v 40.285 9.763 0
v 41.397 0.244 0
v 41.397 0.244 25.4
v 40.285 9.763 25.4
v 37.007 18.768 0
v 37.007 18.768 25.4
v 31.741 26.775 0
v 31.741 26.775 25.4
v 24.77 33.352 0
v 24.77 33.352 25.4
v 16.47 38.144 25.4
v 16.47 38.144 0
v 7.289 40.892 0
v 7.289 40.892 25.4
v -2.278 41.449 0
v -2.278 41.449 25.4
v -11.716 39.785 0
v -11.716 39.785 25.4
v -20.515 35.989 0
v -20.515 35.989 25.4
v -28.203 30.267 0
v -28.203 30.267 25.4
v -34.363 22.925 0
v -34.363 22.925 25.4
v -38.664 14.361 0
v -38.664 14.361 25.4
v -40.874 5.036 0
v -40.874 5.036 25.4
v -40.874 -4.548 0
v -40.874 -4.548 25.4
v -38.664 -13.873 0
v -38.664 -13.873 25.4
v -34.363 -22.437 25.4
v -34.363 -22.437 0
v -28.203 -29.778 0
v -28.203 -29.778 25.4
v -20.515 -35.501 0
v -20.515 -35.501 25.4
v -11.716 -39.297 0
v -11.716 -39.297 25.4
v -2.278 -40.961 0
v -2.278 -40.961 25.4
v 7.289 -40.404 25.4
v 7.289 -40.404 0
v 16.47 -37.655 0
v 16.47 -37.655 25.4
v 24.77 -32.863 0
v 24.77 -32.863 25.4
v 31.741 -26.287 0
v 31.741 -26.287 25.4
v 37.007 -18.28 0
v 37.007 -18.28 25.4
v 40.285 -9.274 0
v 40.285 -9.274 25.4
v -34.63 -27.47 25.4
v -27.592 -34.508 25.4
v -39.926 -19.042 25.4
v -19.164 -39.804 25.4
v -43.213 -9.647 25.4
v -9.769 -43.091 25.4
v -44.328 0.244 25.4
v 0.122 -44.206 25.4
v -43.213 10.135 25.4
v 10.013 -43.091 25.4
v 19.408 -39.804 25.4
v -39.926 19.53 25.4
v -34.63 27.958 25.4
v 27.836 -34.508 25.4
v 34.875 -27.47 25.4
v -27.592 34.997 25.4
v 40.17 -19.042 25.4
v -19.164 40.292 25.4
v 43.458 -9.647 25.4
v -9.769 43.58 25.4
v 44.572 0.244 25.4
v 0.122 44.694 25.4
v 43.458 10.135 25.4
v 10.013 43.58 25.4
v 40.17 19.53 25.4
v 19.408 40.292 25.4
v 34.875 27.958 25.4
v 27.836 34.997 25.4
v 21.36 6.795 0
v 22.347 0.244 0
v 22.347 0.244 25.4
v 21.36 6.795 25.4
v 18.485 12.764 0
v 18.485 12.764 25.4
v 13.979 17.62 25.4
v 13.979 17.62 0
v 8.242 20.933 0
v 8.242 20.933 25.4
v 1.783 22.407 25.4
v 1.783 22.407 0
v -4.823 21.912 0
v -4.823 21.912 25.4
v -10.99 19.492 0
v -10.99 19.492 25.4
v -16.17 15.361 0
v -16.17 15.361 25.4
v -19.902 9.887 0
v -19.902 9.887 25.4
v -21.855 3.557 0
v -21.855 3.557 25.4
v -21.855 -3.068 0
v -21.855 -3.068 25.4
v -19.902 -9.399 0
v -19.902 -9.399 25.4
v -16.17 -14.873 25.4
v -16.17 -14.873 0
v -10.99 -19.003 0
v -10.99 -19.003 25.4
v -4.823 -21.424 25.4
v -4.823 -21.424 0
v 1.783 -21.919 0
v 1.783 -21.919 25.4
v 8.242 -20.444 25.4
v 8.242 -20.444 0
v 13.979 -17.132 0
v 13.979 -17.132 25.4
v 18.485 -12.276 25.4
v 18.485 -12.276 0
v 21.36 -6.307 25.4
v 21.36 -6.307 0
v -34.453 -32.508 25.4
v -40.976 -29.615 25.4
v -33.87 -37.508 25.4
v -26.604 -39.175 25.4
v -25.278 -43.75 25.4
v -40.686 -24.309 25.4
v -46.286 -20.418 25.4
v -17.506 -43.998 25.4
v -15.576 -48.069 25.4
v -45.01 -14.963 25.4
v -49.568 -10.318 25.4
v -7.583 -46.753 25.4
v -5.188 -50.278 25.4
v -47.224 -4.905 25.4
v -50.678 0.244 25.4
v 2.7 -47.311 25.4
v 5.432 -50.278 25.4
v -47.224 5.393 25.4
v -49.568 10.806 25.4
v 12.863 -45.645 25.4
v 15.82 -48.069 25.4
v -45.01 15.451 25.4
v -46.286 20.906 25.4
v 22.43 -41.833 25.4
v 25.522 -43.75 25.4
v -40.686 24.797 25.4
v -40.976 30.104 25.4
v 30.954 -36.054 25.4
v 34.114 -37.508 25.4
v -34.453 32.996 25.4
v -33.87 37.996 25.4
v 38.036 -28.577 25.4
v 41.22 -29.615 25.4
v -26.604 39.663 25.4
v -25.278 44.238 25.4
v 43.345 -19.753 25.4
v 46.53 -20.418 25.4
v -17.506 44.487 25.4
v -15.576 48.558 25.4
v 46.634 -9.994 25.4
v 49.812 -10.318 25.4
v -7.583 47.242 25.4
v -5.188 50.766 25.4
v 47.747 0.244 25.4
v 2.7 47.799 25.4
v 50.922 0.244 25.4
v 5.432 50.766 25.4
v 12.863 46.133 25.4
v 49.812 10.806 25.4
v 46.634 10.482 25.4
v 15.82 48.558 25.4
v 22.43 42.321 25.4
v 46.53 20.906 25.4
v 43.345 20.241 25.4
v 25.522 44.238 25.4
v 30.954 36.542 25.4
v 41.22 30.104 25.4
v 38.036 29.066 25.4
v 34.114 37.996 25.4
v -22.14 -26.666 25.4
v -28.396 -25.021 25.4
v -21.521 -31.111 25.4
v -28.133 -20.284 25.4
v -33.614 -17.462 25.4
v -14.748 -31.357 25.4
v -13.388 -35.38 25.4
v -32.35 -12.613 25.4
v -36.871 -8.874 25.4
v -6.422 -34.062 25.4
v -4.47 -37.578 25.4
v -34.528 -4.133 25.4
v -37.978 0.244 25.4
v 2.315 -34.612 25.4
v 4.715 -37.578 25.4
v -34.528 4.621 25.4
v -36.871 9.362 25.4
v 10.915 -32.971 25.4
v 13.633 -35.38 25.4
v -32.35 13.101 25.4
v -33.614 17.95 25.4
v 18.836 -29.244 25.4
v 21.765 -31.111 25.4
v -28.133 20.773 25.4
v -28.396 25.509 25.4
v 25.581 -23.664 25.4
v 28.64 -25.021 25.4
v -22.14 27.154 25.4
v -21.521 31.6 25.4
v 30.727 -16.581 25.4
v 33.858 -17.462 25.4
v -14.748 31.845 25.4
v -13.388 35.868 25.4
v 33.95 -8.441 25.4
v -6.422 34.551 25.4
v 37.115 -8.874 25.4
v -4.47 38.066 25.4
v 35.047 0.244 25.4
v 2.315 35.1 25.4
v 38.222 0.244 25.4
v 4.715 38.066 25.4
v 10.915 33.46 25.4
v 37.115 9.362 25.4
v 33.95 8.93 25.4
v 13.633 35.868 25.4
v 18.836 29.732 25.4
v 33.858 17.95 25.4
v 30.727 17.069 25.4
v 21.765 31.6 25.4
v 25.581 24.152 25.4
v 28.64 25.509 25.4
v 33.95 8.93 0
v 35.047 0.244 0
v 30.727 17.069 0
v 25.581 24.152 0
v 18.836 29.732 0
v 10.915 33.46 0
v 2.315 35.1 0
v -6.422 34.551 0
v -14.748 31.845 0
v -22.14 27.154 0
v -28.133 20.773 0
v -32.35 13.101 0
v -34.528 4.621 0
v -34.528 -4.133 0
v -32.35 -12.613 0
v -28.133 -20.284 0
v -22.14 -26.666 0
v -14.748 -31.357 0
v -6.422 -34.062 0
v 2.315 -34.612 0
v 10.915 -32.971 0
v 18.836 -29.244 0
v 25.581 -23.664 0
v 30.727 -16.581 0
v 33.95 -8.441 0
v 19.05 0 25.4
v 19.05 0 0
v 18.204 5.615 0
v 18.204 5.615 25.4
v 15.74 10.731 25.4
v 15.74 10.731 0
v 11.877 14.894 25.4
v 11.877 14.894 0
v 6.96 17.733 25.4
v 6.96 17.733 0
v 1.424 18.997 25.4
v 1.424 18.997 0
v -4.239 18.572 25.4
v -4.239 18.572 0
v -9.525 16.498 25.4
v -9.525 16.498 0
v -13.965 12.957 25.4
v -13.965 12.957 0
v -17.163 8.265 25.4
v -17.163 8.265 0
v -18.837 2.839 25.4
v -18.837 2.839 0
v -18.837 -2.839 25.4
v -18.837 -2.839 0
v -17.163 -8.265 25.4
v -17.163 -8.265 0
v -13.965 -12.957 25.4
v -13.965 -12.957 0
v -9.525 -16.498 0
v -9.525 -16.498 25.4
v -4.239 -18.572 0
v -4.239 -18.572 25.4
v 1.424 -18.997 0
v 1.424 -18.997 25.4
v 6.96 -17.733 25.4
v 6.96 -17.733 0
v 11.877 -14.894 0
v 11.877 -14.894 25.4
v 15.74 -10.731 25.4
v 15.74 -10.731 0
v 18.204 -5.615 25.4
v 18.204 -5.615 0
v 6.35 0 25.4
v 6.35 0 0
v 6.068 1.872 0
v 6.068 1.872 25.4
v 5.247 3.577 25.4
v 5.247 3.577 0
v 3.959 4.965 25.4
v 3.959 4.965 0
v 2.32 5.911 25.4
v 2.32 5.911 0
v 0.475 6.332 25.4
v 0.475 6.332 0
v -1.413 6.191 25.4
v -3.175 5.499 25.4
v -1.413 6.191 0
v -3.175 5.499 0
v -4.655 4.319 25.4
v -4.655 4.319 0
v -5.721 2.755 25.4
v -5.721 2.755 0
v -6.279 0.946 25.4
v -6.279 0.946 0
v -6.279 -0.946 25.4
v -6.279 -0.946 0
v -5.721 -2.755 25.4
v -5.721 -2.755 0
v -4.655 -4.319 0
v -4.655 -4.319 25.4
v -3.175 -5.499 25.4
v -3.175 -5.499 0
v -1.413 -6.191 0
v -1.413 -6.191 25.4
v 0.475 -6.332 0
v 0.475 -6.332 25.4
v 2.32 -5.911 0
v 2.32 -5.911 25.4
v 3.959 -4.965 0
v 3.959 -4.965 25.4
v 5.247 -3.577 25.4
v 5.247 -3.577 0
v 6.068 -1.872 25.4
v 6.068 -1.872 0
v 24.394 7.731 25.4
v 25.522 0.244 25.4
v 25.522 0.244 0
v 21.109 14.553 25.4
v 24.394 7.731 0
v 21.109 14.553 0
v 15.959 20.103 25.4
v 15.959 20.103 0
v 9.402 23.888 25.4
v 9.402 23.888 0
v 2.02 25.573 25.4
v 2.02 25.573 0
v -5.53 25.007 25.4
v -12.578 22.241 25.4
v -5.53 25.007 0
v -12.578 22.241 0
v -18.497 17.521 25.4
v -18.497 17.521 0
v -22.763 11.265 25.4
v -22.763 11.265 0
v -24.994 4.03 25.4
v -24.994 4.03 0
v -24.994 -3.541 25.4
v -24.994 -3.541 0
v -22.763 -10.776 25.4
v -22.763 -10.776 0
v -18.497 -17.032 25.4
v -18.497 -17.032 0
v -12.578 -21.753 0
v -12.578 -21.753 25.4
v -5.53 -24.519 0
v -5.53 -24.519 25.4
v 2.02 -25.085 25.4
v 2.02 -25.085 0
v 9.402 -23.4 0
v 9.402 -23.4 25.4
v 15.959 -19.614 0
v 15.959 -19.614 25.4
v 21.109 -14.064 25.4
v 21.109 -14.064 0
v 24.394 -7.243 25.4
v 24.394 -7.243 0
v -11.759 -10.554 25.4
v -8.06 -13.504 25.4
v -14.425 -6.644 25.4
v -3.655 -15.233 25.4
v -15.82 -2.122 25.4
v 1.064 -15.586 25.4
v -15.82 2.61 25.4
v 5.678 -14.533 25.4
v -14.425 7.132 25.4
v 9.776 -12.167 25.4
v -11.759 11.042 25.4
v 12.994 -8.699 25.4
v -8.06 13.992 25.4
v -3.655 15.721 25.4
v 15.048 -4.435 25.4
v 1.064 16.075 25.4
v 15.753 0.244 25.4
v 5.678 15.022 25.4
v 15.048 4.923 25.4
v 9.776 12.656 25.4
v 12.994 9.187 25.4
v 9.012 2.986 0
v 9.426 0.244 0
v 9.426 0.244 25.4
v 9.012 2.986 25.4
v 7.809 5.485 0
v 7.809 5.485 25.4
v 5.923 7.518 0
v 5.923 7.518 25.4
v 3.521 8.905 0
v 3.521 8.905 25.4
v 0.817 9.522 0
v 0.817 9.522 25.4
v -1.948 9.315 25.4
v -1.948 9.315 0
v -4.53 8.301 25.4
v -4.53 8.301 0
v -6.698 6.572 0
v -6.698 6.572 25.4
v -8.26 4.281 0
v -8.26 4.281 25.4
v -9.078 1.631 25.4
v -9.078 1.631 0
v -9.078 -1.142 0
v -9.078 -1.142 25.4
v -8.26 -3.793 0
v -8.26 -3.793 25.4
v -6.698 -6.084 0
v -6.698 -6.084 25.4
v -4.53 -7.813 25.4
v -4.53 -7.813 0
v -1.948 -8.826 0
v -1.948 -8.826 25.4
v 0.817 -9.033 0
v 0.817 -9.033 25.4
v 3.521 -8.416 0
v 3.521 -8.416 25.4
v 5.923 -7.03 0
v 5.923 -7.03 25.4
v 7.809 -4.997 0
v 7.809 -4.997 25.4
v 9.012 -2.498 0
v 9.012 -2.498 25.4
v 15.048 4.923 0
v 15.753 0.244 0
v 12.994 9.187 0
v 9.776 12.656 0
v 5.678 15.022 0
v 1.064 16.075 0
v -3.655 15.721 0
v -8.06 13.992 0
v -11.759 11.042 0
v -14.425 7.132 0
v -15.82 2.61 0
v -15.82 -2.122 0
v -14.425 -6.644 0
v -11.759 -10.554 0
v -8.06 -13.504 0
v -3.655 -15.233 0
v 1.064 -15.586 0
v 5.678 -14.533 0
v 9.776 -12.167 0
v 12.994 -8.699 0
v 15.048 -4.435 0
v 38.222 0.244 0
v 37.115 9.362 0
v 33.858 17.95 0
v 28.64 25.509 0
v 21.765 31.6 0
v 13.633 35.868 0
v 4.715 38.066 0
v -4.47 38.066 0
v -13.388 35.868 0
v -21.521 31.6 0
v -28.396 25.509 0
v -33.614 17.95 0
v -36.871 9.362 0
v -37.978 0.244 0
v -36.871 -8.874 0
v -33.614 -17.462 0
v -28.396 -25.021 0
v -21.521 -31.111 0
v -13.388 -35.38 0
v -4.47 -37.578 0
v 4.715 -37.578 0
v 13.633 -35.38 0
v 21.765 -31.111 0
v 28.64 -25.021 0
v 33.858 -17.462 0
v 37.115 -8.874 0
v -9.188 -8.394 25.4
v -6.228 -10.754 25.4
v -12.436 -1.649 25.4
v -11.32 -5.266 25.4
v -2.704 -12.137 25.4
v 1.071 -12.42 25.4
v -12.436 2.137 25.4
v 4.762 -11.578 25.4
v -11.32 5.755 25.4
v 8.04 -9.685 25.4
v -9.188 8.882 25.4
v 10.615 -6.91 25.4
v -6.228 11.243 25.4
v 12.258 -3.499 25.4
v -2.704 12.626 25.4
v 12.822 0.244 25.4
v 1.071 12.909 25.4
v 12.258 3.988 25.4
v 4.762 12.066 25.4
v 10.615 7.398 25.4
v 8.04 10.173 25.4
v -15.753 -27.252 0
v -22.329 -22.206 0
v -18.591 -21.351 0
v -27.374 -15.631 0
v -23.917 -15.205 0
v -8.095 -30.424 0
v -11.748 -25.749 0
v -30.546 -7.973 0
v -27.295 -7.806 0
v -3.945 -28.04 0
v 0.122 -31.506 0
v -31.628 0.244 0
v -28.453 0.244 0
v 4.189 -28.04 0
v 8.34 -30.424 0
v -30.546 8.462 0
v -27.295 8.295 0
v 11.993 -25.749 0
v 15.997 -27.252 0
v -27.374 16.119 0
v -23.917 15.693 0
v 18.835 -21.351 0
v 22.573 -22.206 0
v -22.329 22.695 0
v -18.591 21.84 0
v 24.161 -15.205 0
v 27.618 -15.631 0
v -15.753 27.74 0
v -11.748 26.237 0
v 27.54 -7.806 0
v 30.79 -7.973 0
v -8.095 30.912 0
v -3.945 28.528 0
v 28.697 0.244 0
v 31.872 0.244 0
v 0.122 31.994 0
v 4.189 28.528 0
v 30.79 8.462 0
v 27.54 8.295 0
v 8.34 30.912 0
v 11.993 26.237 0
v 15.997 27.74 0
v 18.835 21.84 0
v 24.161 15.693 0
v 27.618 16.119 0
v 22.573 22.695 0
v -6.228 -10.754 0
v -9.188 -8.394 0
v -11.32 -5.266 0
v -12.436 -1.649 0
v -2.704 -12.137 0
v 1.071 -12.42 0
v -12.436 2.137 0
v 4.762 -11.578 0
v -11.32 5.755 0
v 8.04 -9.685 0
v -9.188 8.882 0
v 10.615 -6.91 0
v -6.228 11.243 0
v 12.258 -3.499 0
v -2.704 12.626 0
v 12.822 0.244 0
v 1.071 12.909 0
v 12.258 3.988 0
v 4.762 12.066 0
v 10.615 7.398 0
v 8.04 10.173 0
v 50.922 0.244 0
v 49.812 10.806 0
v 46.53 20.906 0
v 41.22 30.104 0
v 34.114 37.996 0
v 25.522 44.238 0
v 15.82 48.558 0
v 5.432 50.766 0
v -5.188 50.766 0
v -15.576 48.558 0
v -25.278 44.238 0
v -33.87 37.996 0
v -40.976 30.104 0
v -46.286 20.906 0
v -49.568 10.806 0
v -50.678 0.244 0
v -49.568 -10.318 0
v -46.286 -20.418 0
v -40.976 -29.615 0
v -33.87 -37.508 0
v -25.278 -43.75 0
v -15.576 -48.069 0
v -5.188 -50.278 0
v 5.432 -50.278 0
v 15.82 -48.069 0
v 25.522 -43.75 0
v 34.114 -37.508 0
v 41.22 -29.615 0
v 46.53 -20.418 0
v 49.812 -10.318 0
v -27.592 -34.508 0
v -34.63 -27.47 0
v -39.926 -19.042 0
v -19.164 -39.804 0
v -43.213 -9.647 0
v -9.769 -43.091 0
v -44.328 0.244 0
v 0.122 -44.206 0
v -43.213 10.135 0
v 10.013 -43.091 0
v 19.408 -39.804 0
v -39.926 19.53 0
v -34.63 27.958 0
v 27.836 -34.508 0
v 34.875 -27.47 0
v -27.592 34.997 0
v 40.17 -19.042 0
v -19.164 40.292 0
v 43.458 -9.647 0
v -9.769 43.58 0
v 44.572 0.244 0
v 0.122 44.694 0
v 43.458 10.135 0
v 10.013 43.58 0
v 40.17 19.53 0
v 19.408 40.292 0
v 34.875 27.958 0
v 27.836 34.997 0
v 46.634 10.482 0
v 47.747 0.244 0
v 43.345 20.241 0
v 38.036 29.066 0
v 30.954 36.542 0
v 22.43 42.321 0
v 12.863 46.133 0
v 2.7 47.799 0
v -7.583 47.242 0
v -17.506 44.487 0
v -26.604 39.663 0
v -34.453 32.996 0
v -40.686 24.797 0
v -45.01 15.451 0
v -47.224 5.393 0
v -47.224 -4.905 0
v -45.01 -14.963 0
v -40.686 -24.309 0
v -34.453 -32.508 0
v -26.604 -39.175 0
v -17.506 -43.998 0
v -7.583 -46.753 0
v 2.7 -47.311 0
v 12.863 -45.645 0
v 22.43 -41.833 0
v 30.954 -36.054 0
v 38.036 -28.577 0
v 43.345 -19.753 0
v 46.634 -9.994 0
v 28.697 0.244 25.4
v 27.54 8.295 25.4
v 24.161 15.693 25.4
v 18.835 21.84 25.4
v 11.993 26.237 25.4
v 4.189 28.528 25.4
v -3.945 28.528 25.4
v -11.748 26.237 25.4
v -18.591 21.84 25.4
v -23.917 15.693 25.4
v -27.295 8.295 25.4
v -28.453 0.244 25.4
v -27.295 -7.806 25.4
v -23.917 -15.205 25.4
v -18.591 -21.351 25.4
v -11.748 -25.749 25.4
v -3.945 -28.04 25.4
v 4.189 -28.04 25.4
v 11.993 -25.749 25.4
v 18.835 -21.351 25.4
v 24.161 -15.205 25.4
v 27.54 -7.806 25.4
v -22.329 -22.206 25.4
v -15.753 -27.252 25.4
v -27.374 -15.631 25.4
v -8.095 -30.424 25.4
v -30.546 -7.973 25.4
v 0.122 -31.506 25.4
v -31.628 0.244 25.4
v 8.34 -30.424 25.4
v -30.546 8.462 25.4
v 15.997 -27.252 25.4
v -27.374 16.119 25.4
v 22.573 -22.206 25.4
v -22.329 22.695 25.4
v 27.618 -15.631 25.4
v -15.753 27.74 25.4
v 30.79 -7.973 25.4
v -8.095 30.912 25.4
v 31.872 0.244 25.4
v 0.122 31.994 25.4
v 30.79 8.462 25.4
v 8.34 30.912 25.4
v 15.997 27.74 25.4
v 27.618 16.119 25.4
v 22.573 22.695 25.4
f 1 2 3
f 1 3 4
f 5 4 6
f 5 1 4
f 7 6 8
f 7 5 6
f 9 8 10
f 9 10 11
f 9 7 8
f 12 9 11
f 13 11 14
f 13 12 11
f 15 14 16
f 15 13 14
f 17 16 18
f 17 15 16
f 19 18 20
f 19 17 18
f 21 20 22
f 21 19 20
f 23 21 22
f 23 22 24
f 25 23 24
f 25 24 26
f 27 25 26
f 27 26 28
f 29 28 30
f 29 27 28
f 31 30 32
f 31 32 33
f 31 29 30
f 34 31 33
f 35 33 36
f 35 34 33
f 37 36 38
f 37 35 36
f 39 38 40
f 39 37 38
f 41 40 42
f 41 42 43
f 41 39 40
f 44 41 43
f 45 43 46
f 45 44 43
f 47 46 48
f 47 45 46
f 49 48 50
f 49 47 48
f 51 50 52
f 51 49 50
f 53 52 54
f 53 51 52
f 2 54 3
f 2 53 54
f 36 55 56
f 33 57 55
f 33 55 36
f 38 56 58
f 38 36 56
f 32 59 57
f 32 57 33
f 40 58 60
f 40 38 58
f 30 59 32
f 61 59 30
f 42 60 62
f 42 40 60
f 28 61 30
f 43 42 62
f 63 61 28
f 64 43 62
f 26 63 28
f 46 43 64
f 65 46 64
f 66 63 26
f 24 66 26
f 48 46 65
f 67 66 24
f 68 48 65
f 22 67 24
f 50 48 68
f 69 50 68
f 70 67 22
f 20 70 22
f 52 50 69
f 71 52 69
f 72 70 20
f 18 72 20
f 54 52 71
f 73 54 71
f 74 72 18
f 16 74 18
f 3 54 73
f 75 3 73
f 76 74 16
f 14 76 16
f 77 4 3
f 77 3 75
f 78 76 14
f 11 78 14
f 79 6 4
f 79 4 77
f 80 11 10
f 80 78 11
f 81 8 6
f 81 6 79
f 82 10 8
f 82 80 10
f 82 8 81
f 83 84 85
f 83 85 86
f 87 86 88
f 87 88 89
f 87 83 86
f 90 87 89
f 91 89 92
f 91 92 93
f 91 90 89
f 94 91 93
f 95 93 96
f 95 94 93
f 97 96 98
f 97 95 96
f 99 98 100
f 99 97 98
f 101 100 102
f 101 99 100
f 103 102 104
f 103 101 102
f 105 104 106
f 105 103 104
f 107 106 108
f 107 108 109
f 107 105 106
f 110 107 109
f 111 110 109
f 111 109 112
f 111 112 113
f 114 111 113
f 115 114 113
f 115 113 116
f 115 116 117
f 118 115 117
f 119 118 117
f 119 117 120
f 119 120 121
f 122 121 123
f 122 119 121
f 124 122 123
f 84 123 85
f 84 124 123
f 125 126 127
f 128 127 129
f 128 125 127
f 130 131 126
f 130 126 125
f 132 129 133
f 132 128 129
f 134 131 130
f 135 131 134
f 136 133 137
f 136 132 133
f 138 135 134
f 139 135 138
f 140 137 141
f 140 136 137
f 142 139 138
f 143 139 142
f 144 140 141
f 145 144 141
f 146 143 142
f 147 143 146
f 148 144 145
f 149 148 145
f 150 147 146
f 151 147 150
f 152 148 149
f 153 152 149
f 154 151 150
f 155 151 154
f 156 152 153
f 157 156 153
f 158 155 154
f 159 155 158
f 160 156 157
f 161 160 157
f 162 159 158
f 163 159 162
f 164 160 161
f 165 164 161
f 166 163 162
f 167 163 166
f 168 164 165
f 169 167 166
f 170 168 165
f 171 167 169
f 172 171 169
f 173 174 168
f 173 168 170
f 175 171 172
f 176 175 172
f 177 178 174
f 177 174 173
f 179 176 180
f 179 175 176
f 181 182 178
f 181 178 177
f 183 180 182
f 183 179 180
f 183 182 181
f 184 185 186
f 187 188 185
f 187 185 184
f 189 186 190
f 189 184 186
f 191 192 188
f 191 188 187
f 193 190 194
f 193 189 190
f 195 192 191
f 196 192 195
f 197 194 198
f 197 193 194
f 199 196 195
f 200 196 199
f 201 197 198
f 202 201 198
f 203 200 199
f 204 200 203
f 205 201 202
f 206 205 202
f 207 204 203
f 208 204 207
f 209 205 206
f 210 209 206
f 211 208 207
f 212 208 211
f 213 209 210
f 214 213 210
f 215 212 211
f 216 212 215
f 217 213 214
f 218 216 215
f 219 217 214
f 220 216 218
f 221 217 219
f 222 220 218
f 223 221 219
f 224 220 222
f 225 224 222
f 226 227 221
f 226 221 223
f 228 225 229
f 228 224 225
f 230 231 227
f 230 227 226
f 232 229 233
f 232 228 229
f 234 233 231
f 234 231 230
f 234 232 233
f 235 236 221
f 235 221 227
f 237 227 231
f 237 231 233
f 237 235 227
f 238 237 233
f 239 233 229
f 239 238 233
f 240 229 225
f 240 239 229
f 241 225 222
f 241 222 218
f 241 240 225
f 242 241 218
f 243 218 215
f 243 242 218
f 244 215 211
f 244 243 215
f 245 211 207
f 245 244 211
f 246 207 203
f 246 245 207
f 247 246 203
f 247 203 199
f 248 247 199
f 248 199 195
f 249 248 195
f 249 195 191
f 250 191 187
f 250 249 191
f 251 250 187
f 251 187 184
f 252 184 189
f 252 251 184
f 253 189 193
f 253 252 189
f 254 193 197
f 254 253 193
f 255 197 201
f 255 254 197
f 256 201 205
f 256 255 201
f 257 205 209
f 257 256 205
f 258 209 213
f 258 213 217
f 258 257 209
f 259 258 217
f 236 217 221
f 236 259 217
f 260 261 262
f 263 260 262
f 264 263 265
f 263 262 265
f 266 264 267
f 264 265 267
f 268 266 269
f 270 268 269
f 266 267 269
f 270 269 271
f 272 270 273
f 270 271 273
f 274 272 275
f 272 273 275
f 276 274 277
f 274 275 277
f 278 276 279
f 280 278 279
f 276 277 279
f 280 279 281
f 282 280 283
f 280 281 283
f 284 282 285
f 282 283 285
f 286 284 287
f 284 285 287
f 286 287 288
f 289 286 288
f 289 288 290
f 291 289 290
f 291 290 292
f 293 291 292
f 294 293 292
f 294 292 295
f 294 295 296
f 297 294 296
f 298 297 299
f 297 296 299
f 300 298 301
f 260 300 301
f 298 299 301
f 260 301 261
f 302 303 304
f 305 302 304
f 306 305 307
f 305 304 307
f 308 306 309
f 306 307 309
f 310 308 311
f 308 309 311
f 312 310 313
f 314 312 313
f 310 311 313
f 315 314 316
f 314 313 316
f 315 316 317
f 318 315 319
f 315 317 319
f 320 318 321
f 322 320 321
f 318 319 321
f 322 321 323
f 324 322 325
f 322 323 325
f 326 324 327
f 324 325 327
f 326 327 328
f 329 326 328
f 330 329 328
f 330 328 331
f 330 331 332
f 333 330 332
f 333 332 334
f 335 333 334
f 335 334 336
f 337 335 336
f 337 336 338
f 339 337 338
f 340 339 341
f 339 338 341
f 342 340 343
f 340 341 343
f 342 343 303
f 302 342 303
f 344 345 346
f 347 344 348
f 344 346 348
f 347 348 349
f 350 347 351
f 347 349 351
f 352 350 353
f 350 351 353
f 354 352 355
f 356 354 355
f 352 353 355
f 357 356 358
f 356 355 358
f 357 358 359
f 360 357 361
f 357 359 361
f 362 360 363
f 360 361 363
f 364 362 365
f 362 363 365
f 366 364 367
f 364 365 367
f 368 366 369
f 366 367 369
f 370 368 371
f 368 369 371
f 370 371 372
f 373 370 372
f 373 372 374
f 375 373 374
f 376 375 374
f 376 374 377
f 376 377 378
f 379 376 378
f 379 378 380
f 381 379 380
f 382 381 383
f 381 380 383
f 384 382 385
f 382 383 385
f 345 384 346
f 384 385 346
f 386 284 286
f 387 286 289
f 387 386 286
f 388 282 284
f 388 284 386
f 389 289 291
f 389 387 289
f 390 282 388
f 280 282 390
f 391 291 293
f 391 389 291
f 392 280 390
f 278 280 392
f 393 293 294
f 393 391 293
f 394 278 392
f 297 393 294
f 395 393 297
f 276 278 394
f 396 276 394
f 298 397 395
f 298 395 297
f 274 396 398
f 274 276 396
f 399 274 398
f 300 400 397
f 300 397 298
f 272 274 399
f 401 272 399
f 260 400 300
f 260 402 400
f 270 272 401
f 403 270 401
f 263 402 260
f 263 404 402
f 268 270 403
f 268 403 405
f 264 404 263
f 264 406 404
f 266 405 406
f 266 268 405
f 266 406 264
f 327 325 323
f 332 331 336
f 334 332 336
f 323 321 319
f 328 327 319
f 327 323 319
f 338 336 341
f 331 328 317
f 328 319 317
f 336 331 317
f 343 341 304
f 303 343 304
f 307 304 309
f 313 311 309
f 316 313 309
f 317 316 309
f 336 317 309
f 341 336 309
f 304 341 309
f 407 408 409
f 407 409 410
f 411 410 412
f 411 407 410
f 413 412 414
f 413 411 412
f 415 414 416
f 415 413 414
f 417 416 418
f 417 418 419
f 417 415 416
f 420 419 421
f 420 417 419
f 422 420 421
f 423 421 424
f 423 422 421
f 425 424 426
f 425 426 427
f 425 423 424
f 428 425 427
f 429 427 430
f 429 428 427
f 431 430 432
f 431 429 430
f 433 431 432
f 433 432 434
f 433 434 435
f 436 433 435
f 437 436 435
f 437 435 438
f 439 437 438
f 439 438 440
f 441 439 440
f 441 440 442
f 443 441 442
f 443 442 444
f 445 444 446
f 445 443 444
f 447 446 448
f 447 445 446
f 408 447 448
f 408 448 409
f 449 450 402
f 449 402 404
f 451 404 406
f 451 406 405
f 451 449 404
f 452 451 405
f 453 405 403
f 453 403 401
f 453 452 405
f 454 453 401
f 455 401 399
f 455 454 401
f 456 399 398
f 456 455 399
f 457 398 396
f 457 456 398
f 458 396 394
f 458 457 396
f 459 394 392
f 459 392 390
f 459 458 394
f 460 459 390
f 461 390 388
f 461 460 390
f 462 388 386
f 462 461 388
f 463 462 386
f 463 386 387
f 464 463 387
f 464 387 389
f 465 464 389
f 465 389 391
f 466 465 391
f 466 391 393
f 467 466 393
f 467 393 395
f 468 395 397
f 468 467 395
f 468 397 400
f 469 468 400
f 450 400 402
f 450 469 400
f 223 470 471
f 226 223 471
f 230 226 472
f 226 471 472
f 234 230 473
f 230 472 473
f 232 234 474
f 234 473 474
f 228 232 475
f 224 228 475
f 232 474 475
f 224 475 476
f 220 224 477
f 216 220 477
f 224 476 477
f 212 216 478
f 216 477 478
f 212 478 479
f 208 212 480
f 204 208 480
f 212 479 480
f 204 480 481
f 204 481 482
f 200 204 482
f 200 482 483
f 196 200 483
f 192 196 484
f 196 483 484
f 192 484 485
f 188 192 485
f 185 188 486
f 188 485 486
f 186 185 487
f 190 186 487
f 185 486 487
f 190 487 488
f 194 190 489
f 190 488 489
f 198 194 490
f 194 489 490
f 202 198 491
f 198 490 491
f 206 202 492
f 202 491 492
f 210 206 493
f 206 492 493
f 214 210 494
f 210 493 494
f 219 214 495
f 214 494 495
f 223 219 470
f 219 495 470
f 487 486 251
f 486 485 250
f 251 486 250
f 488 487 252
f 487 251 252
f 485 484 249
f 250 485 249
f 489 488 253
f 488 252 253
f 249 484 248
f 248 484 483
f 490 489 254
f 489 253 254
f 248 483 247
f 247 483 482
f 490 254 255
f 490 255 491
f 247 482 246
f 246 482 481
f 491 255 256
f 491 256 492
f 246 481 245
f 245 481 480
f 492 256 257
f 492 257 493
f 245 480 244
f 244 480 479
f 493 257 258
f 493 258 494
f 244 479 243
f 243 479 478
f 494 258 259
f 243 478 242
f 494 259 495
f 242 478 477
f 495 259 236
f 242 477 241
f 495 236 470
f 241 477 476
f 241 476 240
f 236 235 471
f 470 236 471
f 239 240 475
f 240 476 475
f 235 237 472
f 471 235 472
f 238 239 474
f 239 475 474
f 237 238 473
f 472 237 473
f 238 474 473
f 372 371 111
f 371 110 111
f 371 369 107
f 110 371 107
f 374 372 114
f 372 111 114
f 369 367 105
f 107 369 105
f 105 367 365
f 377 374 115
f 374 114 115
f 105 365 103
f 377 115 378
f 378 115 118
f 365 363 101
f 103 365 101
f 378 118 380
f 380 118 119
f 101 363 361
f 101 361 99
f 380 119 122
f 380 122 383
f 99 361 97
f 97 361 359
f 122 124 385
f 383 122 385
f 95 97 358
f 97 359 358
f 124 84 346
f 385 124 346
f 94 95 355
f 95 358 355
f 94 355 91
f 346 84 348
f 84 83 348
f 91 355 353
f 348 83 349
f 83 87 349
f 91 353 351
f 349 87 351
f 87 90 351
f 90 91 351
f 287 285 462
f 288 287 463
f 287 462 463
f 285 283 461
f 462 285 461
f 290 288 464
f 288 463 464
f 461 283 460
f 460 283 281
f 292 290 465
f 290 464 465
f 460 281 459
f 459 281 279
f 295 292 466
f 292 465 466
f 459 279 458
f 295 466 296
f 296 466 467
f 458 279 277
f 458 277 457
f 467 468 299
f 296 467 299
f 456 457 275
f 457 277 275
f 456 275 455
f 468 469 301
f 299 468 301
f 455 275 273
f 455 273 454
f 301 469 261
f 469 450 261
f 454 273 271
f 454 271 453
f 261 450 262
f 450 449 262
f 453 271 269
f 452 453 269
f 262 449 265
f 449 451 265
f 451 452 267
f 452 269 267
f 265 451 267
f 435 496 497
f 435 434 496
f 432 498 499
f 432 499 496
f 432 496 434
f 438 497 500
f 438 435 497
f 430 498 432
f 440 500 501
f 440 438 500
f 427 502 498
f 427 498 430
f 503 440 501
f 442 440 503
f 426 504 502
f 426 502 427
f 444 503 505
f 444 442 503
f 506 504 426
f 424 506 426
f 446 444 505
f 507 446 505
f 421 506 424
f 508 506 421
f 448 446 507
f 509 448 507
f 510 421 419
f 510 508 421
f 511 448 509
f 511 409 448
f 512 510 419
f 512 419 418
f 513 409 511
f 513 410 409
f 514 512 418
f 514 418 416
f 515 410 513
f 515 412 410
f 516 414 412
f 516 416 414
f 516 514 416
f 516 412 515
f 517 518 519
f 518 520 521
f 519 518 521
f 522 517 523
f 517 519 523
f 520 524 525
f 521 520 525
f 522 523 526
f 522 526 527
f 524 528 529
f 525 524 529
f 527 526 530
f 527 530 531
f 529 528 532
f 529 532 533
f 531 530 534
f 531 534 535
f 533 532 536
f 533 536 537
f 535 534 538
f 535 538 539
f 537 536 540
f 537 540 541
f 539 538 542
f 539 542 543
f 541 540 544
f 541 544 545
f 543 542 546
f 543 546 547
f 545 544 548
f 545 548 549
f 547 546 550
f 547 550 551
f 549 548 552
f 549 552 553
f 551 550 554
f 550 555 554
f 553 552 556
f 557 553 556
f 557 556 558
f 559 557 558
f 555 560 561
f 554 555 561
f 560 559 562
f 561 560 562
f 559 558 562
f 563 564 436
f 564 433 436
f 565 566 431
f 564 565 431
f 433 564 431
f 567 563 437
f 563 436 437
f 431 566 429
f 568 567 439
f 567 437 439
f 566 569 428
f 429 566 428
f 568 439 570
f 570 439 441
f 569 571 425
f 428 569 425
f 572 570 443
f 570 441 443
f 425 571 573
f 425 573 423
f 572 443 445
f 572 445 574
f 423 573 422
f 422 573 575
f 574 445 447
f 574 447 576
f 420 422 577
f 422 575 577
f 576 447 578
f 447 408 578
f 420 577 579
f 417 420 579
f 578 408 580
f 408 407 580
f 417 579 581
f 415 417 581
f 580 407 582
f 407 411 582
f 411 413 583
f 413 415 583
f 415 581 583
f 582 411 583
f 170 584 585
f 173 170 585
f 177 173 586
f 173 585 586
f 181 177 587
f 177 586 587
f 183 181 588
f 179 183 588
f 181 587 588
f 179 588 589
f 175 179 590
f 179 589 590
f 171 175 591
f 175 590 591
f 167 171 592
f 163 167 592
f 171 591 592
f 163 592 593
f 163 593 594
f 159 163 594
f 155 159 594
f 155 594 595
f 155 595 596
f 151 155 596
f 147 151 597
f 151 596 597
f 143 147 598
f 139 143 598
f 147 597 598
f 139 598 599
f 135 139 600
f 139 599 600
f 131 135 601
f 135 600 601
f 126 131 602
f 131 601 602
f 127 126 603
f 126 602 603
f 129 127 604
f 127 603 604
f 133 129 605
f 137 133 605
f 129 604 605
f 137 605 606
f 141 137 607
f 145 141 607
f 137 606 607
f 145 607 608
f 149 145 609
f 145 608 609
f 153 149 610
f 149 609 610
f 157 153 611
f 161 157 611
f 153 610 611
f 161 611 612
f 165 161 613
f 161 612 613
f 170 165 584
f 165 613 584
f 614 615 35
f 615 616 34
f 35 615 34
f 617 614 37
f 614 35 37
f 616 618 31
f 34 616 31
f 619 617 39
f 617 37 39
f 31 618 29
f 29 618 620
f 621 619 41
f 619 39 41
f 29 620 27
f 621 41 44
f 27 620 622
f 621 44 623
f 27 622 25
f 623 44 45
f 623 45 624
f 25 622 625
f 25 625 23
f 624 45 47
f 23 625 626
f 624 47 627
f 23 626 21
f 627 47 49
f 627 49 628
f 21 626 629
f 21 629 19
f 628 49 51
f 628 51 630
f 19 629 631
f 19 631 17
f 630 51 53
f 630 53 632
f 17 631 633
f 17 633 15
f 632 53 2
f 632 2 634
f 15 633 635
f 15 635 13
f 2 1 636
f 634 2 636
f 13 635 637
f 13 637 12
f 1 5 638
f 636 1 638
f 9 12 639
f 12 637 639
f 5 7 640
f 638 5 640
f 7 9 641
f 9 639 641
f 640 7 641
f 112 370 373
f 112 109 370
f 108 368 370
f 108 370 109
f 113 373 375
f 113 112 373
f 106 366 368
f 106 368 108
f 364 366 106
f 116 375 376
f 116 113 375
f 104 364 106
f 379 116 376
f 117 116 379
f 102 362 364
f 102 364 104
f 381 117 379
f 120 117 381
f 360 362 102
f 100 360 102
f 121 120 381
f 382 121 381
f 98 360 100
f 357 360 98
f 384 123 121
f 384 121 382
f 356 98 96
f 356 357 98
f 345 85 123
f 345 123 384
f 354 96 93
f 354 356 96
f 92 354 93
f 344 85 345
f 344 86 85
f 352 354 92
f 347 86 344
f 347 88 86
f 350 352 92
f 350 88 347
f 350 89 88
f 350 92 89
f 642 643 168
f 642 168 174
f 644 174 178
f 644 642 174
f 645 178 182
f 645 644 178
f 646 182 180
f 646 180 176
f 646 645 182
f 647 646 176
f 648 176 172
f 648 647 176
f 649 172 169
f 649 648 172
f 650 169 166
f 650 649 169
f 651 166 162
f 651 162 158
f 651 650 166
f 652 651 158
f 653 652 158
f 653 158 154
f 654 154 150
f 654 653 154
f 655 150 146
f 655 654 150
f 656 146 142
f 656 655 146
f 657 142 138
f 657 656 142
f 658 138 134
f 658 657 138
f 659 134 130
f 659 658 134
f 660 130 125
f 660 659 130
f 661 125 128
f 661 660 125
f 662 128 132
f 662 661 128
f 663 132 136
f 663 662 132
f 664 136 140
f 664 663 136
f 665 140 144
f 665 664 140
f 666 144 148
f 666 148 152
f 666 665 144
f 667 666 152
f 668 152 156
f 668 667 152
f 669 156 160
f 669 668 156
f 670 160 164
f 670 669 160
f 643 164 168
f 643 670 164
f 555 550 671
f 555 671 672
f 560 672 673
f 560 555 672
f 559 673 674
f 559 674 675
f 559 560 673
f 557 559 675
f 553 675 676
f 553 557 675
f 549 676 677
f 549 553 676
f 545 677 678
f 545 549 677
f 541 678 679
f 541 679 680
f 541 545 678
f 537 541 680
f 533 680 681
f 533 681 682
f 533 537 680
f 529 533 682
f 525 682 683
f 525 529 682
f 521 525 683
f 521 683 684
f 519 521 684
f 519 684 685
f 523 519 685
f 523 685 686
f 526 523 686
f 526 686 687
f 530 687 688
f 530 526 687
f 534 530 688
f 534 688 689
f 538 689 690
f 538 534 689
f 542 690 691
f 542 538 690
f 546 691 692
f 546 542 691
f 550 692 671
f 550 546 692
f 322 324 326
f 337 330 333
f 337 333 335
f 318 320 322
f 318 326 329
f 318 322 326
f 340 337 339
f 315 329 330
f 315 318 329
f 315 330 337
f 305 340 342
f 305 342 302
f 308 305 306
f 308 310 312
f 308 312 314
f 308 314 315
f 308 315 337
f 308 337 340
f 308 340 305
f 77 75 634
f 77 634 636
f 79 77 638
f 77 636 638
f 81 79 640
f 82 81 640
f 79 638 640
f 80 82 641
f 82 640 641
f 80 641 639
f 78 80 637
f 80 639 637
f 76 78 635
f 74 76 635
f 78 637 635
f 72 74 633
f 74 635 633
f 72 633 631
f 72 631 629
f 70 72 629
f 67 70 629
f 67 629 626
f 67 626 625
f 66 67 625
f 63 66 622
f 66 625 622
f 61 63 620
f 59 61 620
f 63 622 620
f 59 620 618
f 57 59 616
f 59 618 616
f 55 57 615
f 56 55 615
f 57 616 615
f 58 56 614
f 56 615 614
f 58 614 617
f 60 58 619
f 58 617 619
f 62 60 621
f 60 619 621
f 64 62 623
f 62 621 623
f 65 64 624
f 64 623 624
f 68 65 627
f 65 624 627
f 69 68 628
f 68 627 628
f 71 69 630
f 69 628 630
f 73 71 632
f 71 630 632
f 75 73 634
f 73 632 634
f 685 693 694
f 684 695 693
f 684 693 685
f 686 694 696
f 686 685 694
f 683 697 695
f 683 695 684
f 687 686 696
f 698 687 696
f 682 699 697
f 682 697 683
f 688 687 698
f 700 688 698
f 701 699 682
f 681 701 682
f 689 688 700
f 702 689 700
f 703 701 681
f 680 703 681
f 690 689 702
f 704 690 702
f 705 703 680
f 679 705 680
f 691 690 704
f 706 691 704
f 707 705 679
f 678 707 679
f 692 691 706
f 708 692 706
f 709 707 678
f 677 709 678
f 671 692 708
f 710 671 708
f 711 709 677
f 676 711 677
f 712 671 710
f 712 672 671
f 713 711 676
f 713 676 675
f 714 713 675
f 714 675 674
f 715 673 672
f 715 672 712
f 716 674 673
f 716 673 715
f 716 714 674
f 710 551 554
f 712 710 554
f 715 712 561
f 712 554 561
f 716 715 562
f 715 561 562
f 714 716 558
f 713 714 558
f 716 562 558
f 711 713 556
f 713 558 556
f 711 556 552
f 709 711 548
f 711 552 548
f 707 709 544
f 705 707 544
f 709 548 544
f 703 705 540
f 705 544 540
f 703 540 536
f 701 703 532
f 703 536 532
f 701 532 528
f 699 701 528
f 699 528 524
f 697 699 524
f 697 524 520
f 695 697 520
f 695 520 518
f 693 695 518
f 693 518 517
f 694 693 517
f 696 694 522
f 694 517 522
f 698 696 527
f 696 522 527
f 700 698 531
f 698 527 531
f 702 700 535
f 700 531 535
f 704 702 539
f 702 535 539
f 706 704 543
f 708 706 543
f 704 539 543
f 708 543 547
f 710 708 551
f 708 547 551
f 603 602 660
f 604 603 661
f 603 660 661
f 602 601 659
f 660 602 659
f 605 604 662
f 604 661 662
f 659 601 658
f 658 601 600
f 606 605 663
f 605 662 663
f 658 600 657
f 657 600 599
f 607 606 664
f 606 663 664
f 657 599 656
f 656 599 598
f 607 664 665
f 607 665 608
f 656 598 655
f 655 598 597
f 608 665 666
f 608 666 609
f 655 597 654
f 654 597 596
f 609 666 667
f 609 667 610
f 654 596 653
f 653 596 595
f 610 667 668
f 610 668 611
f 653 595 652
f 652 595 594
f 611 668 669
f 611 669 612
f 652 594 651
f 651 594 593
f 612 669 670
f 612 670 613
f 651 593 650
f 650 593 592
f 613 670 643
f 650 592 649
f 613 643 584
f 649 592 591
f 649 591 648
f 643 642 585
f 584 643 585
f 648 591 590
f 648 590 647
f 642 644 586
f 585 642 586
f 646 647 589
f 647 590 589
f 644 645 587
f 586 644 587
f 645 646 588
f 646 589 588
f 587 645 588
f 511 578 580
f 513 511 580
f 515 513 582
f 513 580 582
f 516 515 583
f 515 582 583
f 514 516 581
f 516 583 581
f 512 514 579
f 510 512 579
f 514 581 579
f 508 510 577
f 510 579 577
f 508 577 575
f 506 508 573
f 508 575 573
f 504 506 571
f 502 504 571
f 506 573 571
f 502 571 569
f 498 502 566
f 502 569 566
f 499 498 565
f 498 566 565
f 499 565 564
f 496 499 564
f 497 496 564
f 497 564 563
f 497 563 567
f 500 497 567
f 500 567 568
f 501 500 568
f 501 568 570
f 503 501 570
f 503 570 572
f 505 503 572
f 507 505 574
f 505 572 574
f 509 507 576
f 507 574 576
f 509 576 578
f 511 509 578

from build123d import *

# Parameters (mm, degrees)
F0_R     = 6.35
F1_DEPTH = 25.4
F0_R_2   = 12.7
F0_R_3   = 9.3036363398
F0_R_4   = 19.05
F0_R_5   = 15.875
F0_R_6   = 25.4
F0_R_7   = 22.225
F0_R_8   = 31.75
F0_R_9   = 28.575
F0_R_10  = 38.1
F0_R_11  = 34.925
F2_DEPTH = 25.4
F0_R_12  = 44.45
F0_R_13  = 41.275
F0_R_14  = 50.8
F0_R_15  = 47.625


with BuildPart() as f1:
    # F0 (on Top) → F1 (new body)
    with BuildSketch(Plane.XY):
        Circle(F0_R)
    extrude(amount=F1_DEPTH)


with BuildPart() as f1b:
    # F0 (on Top) → F1, piece 2 (new body)
    with BuildSketch(Plane.XY):
        with Locations((0.1220932784, 0.244185629)):
            Circle(F0_R_2)
        with Locations((0.1220932784, 0.244185629)):
            Circle(F0_R_3, mode=Mode.SUBTRACT)
    extrude(amount=F1_DEPTH)


with BuildPart() as f1c:
    # F0 (on Top) → F1, piece 3 (new body)
    with BuildSketch(Plane.XY):
        Circle(F0_R_4)
        with Locations((-0.1220932784, 0.244185629)):
            Circle(F0_R_5, mode=Mode.SUBTRACT)
    extrude(amount=F1_DEPTH)


with BuildPart() as f1d:
    # F0 (on Top) → F1, piece 4 (new body)
    with BuildSketch(Plane.XY):
        with Locations((0.1220932784, 0.244185629)):
            Circle(F0_R_6)
        with Locations((0.1220932784, 0.244185629)):
            Circle(F0_R_7, mode=Mode.SUBTRACT)
    extrude(amount=F1_DEPTH)


with BuildPart() as f1e:
    # F0 (on Top) → F1, piece 5 (new body)
    with BuildSketch(Plane.XY):
        with Locations((0.1220932784, 0.244185629)):
            Circle(F0_R_8)
        with Locations((0.1220932784, 0.244185629)):
            Circle(F0_R_9, mode=Mode.SUBTRACT)
    extrude(amount=F1_DEPTH)


with BuildPart() as f2:
    # F0 (on Top) → F2 (new body)
    with BuildSketch(Plane.XY):
        with Locations((0.1220932784, 0.244185629)):
            Circle(F0_R_10)
        with Locations((0.1220932784, 0.244185629)):
            Circle(F0_R_11, mode=Mode.SUBTRACT)
    extrude(amount=F2_DEPTH)


with BuildPart() as f2b:
    # F0 (on Top) → F2, piece 2 (new body)
    with BuildSketch(Plane.XY):
        with Locations((0.1220932784, 0.244185629)):
            Circle(F0_R_12)
        with Locations((0.1220932784, 0.244185629)):
            Circle(F0_R_13, mode=Mode.SUBTRACT)
    extrude(amount=F2_DEPTH)


with BuildPart() as f2c:
    # F0 (on Top) → F2, piece 3 (new body)
    with BuildSketch(Plane.XY):
        with Locations((0.1220932784, 0.244185629)):
            Circle(F0_R_14)
        with Locations((0.1220932784, 0.244185629)):
            Circle(F0_R_15, mode=Mode.SUBTRACT)
    extrude(amount=F2_DEPTH)


solid = Compound([f1.part, f1b.part, f1c.part, f1d.part, f1e.part, f2.part, f2b.part, f2c.part])
